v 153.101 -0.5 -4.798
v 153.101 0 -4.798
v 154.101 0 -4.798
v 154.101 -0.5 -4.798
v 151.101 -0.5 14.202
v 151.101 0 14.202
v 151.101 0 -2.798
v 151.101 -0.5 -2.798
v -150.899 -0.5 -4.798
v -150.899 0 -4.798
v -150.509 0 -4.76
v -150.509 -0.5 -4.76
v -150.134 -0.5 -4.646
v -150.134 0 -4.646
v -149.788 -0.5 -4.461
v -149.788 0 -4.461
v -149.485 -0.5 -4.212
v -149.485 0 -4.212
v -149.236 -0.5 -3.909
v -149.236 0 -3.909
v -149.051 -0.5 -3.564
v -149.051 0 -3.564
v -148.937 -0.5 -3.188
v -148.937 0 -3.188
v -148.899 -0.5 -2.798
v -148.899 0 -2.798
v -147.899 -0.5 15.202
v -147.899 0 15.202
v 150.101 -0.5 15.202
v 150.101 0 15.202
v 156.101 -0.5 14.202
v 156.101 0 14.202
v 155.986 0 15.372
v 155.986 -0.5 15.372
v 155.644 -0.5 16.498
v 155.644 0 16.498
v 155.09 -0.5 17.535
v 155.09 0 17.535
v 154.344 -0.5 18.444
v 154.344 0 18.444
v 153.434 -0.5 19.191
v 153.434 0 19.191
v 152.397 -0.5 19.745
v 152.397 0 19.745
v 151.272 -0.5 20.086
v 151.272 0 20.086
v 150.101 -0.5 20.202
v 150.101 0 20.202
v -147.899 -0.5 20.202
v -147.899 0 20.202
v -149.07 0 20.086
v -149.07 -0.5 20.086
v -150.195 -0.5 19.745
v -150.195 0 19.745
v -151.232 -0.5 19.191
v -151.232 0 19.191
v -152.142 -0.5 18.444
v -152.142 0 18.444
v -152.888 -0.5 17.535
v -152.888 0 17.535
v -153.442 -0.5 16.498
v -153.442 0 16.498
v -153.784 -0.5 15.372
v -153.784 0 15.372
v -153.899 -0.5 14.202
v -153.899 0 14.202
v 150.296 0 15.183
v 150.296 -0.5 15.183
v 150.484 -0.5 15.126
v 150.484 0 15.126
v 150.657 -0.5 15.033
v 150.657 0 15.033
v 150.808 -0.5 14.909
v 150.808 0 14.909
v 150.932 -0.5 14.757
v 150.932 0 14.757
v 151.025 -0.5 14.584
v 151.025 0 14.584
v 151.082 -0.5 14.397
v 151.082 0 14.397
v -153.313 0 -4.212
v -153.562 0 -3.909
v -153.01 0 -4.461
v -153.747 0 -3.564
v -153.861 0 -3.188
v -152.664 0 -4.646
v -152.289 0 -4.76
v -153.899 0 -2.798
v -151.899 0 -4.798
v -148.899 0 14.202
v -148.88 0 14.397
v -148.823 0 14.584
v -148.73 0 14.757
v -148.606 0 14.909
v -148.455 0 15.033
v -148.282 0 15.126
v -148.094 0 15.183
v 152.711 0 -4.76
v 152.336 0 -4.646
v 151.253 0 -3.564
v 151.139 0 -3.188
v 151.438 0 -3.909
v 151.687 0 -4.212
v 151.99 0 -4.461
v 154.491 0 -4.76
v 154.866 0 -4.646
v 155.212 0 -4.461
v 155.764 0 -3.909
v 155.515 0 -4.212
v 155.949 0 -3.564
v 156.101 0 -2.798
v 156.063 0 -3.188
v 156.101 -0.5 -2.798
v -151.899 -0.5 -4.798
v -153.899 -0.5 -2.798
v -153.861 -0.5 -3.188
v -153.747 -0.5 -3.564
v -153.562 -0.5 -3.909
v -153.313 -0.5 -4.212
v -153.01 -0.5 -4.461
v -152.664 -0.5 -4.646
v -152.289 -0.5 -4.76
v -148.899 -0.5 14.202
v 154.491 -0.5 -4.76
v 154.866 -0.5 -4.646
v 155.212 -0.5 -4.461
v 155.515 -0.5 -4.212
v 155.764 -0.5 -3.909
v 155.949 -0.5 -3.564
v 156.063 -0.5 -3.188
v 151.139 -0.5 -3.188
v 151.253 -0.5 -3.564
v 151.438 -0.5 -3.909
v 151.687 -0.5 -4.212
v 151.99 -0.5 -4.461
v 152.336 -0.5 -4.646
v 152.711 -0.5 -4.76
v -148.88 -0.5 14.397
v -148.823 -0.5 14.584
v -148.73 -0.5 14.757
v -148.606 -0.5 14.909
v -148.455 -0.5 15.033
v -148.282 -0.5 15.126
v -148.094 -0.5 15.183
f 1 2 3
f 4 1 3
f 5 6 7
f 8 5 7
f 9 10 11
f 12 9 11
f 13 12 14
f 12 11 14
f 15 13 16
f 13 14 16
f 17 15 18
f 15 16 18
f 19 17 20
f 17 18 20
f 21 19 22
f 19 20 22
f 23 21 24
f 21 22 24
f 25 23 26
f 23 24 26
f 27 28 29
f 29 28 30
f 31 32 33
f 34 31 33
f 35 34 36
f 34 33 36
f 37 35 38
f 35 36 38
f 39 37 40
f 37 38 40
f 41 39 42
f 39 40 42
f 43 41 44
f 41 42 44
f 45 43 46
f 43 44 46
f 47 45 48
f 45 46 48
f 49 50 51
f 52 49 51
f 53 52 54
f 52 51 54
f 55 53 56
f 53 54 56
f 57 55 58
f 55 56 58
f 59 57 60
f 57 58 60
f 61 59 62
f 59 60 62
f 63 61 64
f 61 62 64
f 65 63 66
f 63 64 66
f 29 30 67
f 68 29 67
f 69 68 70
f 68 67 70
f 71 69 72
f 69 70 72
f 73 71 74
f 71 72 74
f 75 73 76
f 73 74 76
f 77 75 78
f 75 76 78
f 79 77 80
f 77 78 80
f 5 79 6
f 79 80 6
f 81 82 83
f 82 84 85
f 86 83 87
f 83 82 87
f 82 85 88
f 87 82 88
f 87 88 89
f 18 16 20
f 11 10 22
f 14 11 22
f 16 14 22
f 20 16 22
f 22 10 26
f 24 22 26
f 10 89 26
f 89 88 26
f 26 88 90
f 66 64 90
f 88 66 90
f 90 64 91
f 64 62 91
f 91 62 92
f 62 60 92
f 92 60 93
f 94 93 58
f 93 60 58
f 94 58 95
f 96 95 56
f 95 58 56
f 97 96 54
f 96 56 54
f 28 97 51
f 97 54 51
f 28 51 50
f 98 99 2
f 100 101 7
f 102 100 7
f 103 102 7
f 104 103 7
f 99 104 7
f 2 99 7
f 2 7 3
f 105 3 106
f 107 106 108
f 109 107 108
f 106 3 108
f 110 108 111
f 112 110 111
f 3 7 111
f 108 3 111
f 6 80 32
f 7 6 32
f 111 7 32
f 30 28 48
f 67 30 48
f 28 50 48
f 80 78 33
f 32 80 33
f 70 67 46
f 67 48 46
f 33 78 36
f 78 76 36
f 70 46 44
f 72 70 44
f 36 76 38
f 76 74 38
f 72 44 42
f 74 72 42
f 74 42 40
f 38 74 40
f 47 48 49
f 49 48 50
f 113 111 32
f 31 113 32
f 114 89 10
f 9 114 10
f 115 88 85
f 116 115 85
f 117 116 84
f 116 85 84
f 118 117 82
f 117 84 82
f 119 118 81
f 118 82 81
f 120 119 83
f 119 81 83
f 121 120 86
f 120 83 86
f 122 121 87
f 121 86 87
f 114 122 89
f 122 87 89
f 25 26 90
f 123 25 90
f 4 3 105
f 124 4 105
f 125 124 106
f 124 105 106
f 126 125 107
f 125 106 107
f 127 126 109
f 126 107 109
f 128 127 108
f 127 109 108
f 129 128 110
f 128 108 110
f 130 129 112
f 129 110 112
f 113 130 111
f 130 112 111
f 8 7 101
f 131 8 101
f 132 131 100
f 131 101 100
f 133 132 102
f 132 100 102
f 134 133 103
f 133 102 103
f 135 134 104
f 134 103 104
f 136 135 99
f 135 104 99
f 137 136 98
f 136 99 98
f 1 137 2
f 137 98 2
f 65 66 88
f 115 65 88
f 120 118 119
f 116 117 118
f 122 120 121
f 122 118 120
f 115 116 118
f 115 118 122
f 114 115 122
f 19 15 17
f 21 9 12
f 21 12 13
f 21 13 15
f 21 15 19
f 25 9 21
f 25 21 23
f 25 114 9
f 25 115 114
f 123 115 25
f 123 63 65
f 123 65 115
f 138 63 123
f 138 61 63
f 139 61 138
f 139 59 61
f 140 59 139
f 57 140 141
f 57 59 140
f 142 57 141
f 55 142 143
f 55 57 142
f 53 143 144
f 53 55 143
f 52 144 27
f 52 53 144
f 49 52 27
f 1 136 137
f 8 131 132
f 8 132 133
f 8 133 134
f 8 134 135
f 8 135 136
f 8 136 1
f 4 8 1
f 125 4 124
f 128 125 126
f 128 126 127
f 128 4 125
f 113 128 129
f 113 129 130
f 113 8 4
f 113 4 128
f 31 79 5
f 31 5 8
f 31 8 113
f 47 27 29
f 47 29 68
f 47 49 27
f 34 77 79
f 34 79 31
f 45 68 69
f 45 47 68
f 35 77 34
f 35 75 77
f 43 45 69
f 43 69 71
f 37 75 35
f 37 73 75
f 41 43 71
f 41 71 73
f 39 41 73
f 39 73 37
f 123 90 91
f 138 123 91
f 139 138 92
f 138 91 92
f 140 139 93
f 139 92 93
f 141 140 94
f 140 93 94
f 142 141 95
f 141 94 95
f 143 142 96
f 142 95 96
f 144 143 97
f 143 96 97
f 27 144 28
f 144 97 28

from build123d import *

# Parameters (mm, degrees)
F1_DEPTH = 0.5


with BuildPart() as f1:
    # F0 (on Front) → F1 (new body)
    with BuildSketch(Plane.XZ):
        with BuildLine():
            ThreePointArc((-150.898975, -4.798244), (-149.484761, -4.212457), (-148.898975, -2.798244))
            Line((-148.898975, -2.798244), (-148.898975, 14.201756))
            ThreePointArc((-148.898975, 14.201756), (-148.606081, 14.908863), (-147.898975, 15.201756))
            Line((-147.898975, 15.201756), (150.101025, 15.201756))
            ThreePointArc((150.101025, 15.201756), (150.808132, 14.908863), (151.101025, 14.201756))
            Line((151.101025, 14.201756), (151.101025, -2.798244))
            ThreePointArc((151.101025, -2.798244), (151.686812, -4.212457), (153.101025, -4.798244))
            Line((153.101025, -4.798244), (154.101025, -4.798244))
            ThreePointArc((154.101025, -4.798244), (155.515239, -4.212457), (156.101025, -2.798244))
            Line((156.101025, -2.798244), (156.101025, 14.201756))
            ThreePointArc((156.101025, 14.201756), (154.343666, 18.444397), (150.101025, 20.201756))
            Line((150.101025, 20.201756), (-147.898975, 20.201756))
            ThreePointArc((-147.898975, 20.201756), (-152.141615, 18.444397), (-153.898975, 14.201756))
            Line((-153.898975, 14.201756), (-153.898975, -2.798244))
            ThreePointArc((-153.898975, -2.798244), (-153.313188, -4.212457), (-151.898975, -4.798244))
            Line((-151.898975, -4.798244), (-150.898975, -4.798244))
        make_face()
    extrude(amount=F1_DEPTH)


solid = f1.part
